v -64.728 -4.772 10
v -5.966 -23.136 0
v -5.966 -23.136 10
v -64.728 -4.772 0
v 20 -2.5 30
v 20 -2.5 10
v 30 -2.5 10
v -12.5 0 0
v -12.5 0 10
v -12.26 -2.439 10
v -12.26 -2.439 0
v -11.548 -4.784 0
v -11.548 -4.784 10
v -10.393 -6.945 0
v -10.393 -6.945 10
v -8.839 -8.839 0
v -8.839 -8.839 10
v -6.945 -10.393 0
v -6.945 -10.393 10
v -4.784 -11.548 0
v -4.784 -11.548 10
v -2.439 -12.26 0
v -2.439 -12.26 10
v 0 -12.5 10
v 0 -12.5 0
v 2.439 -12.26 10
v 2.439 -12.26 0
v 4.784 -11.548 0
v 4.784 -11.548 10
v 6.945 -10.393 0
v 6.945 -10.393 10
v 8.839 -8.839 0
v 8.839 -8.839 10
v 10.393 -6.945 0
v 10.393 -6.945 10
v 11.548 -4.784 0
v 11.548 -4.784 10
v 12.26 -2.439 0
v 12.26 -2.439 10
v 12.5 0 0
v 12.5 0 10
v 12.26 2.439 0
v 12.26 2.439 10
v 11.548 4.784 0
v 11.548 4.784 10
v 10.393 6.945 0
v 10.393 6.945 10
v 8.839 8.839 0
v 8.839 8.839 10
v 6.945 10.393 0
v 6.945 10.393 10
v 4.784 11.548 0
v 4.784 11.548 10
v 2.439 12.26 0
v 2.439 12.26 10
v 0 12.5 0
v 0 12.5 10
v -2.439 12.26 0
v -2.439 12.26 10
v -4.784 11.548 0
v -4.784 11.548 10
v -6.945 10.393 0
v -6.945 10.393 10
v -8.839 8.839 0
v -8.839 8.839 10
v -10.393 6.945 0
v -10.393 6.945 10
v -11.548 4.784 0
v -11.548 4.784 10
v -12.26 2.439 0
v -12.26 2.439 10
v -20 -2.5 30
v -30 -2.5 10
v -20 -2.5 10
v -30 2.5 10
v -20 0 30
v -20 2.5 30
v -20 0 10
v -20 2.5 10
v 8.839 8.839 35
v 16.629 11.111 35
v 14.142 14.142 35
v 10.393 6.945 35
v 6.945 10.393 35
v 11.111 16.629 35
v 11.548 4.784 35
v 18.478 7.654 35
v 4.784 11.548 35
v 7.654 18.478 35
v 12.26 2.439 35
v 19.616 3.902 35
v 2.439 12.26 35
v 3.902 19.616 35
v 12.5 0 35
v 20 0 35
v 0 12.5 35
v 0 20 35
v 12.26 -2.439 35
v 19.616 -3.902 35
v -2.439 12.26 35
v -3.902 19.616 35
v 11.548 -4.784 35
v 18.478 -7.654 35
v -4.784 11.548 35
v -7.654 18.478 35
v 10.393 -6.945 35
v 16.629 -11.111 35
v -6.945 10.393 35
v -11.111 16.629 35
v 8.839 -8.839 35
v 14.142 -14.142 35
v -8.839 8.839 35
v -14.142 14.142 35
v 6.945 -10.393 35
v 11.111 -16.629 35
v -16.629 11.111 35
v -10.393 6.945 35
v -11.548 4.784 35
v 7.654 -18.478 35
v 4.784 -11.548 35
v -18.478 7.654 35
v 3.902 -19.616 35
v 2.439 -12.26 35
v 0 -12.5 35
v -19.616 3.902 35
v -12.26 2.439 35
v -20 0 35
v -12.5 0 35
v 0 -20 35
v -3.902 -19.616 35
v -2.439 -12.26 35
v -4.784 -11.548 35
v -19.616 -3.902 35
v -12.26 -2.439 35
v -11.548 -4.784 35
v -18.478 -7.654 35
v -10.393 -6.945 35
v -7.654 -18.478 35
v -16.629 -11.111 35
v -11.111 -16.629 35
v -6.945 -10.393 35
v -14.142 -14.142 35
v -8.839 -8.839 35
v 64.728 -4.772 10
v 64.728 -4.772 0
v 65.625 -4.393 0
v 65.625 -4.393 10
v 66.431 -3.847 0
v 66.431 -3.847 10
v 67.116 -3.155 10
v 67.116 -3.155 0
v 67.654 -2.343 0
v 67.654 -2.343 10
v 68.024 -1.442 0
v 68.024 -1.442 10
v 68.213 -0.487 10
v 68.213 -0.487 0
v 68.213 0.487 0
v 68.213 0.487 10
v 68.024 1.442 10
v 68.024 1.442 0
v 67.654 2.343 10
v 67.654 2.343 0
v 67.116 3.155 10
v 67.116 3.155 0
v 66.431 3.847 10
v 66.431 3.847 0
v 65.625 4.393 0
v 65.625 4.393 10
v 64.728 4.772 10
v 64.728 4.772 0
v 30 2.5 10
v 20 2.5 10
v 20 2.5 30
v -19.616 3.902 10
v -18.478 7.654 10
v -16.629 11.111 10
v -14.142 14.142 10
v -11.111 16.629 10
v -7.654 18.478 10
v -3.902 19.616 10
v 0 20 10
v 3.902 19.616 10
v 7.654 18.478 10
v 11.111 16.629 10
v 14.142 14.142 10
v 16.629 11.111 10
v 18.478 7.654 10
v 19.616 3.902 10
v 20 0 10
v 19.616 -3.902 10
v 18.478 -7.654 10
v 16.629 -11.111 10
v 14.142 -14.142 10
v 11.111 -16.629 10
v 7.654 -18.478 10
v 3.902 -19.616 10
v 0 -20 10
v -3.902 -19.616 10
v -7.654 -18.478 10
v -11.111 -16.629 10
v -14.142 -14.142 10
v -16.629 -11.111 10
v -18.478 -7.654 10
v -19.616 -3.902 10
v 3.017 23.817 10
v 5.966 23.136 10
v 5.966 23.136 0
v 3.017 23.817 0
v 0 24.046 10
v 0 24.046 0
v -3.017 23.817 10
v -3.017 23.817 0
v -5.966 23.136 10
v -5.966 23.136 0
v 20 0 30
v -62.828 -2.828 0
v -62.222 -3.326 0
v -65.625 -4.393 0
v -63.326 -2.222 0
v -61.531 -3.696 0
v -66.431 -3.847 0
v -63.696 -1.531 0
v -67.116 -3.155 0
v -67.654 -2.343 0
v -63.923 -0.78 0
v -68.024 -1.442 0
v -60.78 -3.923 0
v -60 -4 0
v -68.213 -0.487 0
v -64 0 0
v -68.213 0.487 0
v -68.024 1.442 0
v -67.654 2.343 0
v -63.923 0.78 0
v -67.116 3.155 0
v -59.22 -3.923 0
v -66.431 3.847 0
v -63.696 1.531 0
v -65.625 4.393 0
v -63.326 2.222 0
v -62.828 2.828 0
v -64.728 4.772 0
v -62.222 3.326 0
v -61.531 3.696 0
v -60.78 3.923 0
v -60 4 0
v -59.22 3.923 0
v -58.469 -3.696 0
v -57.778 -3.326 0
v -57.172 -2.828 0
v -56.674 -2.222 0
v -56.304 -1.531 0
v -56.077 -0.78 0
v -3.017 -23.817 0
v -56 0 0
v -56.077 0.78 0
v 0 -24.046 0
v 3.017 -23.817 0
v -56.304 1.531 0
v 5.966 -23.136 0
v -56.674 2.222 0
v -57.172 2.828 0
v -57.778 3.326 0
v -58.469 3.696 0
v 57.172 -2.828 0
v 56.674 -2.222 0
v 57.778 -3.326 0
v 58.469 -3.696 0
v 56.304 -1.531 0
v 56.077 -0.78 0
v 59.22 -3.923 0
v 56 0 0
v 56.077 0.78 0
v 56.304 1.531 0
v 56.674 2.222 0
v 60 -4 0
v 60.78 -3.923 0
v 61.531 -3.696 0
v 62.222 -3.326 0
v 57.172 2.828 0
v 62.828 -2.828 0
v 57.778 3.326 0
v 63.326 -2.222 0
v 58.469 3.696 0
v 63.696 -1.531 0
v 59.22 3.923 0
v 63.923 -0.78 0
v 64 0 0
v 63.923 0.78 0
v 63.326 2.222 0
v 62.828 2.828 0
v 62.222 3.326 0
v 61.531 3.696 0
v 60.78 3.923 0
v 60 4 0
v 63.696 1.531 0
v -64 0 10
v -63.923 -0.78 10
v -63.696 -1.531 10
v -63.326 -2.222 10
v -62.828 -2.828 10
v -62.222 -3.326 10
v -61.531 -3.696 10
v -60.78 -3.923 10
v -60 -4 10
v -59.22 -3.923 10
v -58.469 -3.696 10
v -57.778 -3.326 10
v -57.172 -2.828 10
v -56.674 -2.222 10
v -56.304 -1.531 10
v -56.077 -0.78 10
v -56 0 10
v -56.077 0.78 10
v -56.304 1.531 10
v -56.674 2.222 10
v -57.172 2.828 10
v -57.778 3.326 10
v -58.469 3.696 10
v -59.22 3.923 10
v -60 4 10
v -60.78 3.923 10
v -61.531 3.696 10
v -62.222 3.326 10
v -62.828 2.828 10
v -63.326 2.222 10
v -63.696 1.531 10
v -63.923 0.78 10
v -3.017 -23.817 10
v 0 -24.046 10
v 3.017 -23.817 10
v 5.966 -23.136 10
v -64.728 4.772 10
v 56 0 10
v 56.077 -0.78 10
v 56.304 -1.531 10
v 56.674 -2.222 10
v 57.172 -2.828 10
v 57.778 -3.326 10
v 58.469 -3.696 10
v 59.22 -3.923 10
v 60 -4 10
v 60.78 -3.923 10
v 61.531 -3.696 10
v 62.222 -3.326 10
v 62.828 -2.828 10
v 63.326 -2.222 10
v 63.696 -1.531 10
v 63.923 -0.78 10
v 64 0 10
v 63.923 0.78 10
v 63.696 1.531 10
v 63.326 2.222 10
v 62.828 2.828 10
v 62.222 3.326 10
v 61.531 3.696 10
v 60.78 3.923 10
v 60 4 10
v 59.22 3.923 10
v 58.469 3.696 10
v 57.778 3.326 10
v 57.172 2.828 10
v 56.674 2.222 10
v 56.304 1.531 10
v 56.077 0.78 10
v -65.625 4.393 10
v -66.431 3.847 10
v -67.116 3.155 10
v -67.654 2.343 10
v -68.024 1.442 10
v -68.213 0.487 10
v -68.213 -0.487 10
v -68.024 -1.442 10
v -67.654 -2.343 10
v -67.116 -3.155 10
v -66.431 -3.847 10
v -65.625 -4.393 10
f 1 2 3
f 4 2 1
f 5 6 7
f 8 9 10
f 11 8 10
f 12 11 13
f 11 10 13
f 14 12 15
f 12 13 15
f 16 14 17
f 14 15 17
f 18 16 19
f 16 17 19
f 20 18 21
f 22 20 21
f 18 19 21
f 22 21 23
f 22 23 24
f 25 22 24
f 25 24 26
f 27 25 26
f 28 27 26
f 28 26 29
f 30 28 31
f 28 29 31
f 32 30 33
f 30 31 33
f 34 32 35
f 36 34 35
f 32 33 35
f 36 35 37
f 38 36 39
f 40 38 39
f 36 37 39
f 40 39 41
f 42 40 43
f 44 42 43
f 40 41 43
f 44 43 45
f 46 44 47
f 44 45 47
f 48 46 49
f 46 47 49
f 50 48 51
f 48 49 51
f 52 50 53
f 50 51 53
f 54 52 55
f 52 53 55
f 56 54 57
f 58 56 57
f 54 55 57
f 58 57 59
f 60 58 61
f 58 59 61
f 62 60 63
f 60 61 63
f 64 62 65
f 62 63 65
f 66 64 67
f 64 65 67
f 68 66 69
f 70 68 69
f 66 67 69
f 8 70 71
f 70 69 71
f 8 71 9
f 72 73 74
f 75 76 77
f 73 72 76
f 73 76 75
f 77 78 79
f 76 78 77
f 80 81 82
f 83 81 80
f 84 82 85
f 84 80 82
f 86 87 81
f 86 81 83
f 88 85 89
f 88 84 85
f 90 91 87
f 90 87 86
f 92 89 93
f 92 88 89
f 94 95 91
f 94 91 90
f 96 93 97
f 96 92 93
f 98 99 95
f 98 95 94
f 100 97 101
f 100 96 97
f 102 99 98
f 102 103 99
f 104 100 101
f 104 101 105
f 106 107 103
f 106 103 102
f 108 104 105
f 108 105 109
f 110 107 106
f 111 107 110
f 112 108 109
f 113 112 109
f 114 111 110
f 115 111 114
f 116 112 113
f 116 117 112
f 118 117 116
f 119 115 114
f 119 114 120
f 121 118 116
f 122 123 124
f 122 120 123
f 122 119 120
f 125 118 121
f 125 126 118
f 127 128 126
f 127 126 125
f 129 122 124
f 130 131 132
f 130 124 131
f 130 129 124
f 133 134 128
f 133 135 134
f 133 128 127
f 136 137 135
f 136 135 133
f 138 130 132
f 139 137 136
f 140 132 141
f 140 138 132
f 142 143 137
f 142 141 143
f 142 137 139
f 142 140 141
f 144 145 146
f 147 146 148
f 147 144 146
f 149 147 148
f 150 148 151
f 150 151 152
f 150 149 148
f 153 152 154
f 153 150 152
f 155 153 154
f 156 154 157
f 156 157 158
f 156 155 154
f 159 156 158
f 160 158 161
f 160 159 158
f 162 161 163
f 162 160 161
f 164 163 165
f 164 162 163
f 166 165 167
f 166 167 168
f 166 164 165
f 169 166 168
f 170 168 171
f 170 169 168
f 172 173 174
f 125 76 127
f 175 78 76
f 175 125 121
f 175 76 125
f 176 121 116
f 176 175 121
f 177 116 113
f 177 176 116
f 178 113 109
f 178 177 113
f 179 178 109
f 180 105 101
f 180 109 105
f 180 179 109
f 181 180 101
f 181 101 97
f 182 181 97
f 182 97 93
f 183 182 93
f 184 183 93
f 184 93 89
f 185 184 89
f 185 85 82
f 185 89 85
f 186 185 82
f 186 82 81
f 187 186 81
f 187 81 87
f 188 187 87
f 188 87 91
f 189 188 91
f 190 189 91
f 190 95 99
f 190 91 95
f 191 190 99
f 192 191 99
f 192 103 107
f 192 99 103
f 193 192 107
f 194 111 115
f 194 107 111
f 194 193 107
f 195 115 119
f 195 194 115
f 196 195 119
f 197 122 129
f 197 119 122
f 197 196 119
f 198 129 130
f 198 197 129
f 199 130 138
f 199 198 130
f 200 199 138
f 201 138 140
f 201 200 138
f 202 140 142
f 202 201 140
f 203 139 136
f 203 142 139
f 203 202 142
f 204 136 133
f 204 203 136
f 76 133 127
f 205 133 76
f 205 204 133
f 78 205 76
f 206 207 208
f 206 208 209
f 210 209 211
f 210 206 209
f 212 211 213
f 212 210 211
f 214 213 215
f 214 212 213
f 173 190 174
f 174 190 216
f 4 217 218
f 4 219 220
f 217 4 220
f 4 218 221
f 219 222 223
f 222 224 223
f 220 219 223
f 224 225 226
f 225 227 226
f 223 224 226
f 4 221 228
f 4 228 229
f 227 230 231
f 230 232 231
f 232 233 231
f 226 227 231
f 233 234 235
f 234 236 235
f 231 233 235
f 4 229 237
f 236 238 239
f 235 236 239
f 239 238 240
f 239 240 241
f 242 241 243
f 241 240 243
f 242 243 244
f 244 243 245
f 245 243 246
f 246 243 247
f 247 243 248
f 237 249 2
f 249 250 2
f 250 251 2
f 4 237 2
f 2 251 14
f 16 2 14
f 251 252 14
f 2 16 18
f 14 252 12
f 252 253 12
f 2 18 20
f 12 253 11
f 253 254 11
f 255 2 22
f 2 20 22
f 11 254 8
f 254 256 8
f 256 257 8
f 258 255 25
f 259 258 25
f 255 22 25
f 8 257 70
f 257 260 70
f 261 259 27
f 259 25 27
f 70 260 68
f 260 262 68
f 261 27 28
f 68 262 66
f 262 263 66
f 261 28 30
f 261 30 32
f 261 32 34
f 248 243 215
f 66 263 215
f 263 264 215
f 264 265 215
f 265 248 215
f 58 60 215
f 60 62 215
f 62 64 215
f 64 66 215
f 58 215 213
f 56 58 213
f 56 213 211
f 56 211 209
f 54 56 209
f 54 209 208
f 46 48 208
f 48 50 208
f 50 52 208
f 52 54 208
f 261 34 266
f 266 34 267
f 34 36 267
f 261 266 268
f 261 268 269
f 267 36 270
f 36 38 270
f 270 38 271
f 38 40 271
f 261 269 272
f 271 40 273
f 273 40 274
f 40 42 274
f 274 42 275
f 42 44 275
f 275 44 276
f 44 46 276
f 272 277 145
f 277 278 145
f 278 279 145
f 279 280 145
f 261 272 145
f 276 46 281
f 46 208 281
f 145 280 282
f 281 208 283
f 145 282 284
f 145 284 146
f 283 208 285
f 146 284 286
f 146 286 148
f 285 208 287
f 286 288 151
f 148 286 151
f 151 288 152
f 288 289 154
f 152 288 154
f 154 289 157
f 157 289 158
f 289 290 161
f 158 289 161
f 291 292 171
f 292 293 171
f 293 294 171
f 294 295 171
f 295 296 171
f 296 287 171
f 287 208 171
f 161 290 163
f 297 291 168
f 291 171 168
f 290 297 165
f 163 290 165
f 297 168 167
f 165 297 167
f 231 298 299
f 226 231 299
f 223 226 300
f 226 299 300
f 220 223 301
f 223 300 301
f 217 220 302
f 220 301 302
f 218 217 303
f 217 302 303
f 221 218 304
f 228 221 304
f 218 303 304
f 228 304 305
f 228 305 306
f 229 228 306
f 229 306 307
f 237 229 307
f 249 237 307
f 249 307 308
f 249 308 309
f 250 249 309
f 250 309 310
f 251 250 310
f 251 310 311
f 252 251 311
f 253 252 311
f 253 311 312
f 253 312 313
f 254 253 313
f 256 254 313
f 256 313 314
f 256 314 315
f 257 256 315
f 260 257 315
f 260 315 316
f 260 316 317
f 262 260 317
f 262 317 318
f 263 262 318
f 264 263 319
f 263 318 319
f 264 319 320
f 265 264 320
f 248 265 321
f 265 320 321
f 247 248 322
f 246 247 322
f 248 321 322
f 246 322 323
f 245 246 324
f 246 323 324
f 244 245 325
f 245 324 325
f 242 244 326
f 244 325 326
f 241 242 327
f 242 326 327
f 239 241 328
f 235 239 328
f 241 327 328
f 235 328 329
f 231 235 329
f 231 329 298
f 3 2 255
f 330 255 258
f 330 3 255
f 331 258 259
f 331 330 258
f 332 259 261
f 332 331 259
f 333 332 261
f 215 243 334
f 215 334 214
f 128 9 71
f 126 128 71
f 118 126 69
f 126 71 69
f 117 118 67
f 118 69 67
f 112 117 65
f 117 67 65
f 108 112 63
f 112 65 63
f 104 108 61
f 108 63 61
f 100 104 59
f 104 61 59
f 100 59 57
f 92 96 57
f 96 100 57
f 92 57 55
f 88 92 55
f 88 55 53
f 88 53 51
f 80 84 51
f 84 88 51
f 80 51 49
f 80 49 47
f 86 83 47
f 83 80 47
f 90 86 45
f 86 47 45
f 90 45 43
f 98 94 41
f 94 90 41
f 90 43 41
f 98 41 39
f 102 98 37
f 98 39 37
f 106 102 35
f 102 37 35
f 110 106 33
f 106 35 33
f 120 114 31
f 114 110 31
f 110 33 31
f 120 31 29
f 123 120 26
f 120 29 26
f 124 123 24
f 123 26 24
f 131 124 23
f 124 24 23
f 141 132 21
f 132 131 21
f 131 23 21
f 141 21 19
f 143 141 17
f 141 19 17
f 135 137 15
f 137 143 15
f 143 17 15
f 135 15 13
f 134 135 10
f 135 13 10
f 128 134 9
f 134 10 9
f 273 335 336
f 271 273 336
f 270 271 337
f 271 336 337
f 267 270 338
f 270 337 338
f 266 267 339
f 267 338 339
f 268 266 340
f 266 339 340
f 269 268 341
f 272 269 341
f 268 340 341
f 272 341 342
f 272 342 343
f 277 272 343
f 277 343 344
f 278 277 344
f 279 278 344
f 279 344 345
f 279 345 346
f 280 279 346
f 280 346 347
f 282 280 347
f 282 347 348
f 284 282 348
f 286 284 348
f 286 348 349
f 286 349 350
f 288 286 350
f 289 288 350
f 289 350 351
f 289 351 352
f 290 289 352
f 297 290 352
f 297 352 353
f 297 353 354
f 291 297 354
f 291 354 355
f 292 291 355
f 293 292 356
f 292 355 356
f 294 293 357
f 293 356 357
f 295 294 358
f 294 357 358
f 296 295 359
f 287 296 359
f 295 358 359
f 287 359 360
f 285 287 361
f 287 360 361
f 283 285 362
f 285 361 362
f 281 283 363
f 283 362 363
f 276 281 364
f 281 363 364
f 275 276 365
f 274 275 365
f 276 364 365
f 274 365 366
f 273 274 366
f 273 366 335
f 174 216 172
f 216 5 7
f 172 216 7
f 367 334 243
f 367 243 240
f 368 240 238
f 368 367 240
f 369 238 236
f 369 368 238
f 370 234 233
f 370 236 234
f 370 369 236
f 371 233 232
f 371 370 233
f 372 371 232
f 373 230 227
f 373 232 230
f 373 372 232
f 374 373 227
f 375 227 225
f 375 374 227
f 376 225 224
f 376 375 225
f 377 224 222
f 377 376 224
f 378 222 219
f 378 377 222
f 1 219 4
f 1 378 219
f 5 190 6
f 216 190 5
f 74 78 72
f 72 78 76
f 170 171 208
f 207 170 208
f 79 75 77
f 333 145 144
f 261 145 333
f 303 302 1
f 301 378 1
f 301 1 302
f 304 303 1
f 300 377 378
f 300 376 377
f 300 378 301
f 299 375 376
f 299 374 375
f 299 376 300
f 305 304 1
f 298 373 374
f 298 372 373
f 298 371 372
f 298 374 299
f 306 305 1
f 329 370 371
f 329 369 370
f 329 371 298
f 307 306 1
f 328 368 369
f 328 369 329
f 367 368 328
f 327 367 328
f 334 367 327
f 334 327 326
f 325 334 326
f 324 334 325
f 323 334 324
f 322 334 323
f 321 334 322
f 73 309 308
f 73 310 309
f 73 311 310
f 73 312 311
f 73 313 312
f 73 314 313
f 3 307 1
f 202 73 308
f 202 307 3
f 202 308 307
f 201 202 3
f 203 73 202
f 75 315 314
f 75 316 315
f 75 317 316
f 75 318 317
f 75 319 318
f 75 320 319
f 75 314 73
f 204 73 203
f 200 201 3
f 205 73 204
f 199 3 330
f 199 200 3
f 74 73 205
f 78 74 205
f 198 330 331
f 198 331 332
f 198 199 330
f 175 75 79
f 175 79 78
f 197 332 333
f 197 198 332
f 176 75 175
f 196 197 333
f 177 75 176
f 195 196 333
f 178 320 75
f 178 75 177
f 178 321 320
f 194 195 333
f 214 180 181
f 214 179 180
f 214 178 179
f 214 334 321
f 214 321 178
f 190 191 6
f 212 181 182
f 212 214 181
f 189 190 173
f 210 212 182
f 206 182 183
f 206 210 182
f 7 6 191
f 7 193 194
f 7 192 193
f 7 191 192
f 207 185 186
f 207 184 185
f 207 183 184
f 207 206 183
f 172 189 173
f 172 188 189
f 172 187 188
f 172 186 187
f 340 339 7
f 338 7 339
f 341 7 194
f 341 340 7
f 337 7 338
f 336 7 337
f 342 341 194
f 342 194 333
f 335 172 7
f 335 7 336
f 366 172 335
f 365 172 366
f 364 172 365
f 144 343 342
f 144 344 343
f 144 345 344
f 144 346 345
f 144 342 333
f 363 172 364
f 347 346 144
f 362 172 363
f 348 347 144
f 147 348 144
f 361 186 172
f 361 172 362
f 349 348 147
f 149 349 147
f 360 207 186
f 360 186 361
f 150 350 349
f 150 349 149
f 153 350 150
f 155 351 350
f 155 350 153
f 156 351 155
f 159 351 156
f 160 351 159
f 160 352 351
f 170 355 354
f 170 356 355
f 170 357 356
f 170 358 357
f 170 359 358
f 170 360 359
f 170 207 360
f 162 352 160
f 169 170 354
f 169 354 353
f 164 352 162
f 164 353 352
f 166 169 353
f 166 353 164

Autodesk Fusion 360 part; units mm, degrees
sketch "Sketch1" plane through (0, 0, 0) normal (0, 0, 1) x (1, 0, 0)
  line L0 (0, -25) -> (-80, 0)
  line L1 (-80, 0) -> (0, 25)
  line L2 (80, 0) -> (0, 25)
  line L3 (80, 0) -> (0, -25)
extrude "Extrude1" add sketch "Sketch1" along normal blind 10 makes body 1
fillet "Fillet3" radius 20 1 edges at (0, 25, 5) on bodies 1
fillet "Fillet4" radius 20 1 edges at (0, -25, 5) on bodies 1
sketch "Sketch5" plane through (0, 0, 10) normal (0, 0, 1) x (-1, 0, 0)
  arc A0 (5.9655, 23.1358) -> (-5.9655, 23.1358) centre (0, 4.0462) ccw
  line L0 (-5.9655, 23.1358) -> (-80, 0)
  line L1 (-80, 0) -> (-5.9655, -23.1358)
  arc A1 (-5.9655, -23.1358) -> (5.9655, -23.1358) centre (0, -4.0462) ccw
  line L2 (5.9655, -23.1358) -> (80, 0)
  line L3 (80, 0) -> (5.9655, 23.1358)
  circle A2 centre (0, 0) radius 20
  circle A3 centre (0, 0) radius 12.5
  dimension "d19" = 25
extrude "Extrude5" add sketch "Sketch5" along normal blind 25 contours A2 bodies 1
extrude "Extrude6" cut 1 faces at (-0.8448, -2.1525, 10) along direction (0, 0, -1) blind 60 on bodies 1 bodies 1
sketch "Sketch8" plane through (0, 0, 0) normal (0, 1, 0) x (1, 0, 0)
  line L0 (-20, -30) -> (-30, -10)
  line L1 (-30, -10) -> (-20, -10)
  line L2 (-20, -10) -> (-20, -30)
  line L3 (20, -30) -> (30, -10)
  line L4 (30, -10) -> (20, -10)
  line L5 (20, -10) -> (20, -30)
extrude "Extrude8" add sketch "Sketch8" along normal blind 2.5 separate body makes body 2 at (-23.3333, 0, 16.6667) makes body 3 at (23.3333, 0, 16.6667)
extrude "Extrude9" add 1 faces at (-23.3333, 0, 16.6667) along direction (0, -1, 0) blind 2.5 on bodies 2 bodies 2 3 1
extrude "Extrude10" add 1 faces at (23.3333, 0, 16.6667) along direction (0, -1, 0) blind 2.5 on bodies 3 bodies 3 2
fillet "Fillet5" radius 5 1 edges at (-80, 0, 5) on bodies 3
fillet "Fillet6" radius 5 1 edges at (80, 0, 5) on bodies 3
sketch "Sketch9" plane through (0, 0, 10) normal (0, 0, 1) x (-1, 0, 0)
  arc A0 (-20, 0) -> (20, 0) centre (0, 0) ccw
  line L0 (-20, 0) -> (-20, -2.5)
  line L1 (-20, -2.5) -> (-30, -2.5)
  line L2 (-30, -2.5) -> (-30, 2.5)
  line L3 (-30, 2.5) -> (-20, 2.5)
  line L4 (-20, 2.5) -> (-20, 0)
  arc A1 (20, 0) -> (-20, 0) centre (0, 0) ccw
  line L5 (20, 0) -> (20, 2.5)
  line L6 (20, 2.5) -> (30, 2.5)
  line L7 (30, 2.5) -> (30, -2.5)
  line L8 (30, -2.5) -> (20, -2.5)
  line L9 (20, -2.5) -> (20, 0)
  arc A2 (-64.7283, 4.7724) -> (-64.7283, -4.7724) centre (-63.2369, 0) ccw
  line L10 (-64.7283, -4.7724) -> (-5.9655, -23.1358)
  arc A3 (-5.9655, -23.1358) -> (5.9655, -23.1358) centre (0, -4.0462) ccw
  line L11 (5.9655, -23.1358) -> (64.7283, -4.7724)
  arc A4 (64.7283, -4.7724) -> (64.7283, 4.7724) centre (63.2369, 0) ccw
  line L12 (64.7283, 4.7724) -> (5.9655, 23.1358)
  arc A5 (5.9655, 23.1358) -> (-5.9655, 23.1358) centre (0, 4.0462) ccw
  line L13 (-5.9655, 23.1358) -> (-64.7283, 4.7724)
  circle A6 centre (60, 0) radius 4
  circle A7 centre (-60, 0) radius 4
  dimension "d34" = 8
  dimension "d35" = 8
extrude "Extrude11" cut sketch "Sketch9" against normal blind 40 contours A6 | A7 bodies 3
